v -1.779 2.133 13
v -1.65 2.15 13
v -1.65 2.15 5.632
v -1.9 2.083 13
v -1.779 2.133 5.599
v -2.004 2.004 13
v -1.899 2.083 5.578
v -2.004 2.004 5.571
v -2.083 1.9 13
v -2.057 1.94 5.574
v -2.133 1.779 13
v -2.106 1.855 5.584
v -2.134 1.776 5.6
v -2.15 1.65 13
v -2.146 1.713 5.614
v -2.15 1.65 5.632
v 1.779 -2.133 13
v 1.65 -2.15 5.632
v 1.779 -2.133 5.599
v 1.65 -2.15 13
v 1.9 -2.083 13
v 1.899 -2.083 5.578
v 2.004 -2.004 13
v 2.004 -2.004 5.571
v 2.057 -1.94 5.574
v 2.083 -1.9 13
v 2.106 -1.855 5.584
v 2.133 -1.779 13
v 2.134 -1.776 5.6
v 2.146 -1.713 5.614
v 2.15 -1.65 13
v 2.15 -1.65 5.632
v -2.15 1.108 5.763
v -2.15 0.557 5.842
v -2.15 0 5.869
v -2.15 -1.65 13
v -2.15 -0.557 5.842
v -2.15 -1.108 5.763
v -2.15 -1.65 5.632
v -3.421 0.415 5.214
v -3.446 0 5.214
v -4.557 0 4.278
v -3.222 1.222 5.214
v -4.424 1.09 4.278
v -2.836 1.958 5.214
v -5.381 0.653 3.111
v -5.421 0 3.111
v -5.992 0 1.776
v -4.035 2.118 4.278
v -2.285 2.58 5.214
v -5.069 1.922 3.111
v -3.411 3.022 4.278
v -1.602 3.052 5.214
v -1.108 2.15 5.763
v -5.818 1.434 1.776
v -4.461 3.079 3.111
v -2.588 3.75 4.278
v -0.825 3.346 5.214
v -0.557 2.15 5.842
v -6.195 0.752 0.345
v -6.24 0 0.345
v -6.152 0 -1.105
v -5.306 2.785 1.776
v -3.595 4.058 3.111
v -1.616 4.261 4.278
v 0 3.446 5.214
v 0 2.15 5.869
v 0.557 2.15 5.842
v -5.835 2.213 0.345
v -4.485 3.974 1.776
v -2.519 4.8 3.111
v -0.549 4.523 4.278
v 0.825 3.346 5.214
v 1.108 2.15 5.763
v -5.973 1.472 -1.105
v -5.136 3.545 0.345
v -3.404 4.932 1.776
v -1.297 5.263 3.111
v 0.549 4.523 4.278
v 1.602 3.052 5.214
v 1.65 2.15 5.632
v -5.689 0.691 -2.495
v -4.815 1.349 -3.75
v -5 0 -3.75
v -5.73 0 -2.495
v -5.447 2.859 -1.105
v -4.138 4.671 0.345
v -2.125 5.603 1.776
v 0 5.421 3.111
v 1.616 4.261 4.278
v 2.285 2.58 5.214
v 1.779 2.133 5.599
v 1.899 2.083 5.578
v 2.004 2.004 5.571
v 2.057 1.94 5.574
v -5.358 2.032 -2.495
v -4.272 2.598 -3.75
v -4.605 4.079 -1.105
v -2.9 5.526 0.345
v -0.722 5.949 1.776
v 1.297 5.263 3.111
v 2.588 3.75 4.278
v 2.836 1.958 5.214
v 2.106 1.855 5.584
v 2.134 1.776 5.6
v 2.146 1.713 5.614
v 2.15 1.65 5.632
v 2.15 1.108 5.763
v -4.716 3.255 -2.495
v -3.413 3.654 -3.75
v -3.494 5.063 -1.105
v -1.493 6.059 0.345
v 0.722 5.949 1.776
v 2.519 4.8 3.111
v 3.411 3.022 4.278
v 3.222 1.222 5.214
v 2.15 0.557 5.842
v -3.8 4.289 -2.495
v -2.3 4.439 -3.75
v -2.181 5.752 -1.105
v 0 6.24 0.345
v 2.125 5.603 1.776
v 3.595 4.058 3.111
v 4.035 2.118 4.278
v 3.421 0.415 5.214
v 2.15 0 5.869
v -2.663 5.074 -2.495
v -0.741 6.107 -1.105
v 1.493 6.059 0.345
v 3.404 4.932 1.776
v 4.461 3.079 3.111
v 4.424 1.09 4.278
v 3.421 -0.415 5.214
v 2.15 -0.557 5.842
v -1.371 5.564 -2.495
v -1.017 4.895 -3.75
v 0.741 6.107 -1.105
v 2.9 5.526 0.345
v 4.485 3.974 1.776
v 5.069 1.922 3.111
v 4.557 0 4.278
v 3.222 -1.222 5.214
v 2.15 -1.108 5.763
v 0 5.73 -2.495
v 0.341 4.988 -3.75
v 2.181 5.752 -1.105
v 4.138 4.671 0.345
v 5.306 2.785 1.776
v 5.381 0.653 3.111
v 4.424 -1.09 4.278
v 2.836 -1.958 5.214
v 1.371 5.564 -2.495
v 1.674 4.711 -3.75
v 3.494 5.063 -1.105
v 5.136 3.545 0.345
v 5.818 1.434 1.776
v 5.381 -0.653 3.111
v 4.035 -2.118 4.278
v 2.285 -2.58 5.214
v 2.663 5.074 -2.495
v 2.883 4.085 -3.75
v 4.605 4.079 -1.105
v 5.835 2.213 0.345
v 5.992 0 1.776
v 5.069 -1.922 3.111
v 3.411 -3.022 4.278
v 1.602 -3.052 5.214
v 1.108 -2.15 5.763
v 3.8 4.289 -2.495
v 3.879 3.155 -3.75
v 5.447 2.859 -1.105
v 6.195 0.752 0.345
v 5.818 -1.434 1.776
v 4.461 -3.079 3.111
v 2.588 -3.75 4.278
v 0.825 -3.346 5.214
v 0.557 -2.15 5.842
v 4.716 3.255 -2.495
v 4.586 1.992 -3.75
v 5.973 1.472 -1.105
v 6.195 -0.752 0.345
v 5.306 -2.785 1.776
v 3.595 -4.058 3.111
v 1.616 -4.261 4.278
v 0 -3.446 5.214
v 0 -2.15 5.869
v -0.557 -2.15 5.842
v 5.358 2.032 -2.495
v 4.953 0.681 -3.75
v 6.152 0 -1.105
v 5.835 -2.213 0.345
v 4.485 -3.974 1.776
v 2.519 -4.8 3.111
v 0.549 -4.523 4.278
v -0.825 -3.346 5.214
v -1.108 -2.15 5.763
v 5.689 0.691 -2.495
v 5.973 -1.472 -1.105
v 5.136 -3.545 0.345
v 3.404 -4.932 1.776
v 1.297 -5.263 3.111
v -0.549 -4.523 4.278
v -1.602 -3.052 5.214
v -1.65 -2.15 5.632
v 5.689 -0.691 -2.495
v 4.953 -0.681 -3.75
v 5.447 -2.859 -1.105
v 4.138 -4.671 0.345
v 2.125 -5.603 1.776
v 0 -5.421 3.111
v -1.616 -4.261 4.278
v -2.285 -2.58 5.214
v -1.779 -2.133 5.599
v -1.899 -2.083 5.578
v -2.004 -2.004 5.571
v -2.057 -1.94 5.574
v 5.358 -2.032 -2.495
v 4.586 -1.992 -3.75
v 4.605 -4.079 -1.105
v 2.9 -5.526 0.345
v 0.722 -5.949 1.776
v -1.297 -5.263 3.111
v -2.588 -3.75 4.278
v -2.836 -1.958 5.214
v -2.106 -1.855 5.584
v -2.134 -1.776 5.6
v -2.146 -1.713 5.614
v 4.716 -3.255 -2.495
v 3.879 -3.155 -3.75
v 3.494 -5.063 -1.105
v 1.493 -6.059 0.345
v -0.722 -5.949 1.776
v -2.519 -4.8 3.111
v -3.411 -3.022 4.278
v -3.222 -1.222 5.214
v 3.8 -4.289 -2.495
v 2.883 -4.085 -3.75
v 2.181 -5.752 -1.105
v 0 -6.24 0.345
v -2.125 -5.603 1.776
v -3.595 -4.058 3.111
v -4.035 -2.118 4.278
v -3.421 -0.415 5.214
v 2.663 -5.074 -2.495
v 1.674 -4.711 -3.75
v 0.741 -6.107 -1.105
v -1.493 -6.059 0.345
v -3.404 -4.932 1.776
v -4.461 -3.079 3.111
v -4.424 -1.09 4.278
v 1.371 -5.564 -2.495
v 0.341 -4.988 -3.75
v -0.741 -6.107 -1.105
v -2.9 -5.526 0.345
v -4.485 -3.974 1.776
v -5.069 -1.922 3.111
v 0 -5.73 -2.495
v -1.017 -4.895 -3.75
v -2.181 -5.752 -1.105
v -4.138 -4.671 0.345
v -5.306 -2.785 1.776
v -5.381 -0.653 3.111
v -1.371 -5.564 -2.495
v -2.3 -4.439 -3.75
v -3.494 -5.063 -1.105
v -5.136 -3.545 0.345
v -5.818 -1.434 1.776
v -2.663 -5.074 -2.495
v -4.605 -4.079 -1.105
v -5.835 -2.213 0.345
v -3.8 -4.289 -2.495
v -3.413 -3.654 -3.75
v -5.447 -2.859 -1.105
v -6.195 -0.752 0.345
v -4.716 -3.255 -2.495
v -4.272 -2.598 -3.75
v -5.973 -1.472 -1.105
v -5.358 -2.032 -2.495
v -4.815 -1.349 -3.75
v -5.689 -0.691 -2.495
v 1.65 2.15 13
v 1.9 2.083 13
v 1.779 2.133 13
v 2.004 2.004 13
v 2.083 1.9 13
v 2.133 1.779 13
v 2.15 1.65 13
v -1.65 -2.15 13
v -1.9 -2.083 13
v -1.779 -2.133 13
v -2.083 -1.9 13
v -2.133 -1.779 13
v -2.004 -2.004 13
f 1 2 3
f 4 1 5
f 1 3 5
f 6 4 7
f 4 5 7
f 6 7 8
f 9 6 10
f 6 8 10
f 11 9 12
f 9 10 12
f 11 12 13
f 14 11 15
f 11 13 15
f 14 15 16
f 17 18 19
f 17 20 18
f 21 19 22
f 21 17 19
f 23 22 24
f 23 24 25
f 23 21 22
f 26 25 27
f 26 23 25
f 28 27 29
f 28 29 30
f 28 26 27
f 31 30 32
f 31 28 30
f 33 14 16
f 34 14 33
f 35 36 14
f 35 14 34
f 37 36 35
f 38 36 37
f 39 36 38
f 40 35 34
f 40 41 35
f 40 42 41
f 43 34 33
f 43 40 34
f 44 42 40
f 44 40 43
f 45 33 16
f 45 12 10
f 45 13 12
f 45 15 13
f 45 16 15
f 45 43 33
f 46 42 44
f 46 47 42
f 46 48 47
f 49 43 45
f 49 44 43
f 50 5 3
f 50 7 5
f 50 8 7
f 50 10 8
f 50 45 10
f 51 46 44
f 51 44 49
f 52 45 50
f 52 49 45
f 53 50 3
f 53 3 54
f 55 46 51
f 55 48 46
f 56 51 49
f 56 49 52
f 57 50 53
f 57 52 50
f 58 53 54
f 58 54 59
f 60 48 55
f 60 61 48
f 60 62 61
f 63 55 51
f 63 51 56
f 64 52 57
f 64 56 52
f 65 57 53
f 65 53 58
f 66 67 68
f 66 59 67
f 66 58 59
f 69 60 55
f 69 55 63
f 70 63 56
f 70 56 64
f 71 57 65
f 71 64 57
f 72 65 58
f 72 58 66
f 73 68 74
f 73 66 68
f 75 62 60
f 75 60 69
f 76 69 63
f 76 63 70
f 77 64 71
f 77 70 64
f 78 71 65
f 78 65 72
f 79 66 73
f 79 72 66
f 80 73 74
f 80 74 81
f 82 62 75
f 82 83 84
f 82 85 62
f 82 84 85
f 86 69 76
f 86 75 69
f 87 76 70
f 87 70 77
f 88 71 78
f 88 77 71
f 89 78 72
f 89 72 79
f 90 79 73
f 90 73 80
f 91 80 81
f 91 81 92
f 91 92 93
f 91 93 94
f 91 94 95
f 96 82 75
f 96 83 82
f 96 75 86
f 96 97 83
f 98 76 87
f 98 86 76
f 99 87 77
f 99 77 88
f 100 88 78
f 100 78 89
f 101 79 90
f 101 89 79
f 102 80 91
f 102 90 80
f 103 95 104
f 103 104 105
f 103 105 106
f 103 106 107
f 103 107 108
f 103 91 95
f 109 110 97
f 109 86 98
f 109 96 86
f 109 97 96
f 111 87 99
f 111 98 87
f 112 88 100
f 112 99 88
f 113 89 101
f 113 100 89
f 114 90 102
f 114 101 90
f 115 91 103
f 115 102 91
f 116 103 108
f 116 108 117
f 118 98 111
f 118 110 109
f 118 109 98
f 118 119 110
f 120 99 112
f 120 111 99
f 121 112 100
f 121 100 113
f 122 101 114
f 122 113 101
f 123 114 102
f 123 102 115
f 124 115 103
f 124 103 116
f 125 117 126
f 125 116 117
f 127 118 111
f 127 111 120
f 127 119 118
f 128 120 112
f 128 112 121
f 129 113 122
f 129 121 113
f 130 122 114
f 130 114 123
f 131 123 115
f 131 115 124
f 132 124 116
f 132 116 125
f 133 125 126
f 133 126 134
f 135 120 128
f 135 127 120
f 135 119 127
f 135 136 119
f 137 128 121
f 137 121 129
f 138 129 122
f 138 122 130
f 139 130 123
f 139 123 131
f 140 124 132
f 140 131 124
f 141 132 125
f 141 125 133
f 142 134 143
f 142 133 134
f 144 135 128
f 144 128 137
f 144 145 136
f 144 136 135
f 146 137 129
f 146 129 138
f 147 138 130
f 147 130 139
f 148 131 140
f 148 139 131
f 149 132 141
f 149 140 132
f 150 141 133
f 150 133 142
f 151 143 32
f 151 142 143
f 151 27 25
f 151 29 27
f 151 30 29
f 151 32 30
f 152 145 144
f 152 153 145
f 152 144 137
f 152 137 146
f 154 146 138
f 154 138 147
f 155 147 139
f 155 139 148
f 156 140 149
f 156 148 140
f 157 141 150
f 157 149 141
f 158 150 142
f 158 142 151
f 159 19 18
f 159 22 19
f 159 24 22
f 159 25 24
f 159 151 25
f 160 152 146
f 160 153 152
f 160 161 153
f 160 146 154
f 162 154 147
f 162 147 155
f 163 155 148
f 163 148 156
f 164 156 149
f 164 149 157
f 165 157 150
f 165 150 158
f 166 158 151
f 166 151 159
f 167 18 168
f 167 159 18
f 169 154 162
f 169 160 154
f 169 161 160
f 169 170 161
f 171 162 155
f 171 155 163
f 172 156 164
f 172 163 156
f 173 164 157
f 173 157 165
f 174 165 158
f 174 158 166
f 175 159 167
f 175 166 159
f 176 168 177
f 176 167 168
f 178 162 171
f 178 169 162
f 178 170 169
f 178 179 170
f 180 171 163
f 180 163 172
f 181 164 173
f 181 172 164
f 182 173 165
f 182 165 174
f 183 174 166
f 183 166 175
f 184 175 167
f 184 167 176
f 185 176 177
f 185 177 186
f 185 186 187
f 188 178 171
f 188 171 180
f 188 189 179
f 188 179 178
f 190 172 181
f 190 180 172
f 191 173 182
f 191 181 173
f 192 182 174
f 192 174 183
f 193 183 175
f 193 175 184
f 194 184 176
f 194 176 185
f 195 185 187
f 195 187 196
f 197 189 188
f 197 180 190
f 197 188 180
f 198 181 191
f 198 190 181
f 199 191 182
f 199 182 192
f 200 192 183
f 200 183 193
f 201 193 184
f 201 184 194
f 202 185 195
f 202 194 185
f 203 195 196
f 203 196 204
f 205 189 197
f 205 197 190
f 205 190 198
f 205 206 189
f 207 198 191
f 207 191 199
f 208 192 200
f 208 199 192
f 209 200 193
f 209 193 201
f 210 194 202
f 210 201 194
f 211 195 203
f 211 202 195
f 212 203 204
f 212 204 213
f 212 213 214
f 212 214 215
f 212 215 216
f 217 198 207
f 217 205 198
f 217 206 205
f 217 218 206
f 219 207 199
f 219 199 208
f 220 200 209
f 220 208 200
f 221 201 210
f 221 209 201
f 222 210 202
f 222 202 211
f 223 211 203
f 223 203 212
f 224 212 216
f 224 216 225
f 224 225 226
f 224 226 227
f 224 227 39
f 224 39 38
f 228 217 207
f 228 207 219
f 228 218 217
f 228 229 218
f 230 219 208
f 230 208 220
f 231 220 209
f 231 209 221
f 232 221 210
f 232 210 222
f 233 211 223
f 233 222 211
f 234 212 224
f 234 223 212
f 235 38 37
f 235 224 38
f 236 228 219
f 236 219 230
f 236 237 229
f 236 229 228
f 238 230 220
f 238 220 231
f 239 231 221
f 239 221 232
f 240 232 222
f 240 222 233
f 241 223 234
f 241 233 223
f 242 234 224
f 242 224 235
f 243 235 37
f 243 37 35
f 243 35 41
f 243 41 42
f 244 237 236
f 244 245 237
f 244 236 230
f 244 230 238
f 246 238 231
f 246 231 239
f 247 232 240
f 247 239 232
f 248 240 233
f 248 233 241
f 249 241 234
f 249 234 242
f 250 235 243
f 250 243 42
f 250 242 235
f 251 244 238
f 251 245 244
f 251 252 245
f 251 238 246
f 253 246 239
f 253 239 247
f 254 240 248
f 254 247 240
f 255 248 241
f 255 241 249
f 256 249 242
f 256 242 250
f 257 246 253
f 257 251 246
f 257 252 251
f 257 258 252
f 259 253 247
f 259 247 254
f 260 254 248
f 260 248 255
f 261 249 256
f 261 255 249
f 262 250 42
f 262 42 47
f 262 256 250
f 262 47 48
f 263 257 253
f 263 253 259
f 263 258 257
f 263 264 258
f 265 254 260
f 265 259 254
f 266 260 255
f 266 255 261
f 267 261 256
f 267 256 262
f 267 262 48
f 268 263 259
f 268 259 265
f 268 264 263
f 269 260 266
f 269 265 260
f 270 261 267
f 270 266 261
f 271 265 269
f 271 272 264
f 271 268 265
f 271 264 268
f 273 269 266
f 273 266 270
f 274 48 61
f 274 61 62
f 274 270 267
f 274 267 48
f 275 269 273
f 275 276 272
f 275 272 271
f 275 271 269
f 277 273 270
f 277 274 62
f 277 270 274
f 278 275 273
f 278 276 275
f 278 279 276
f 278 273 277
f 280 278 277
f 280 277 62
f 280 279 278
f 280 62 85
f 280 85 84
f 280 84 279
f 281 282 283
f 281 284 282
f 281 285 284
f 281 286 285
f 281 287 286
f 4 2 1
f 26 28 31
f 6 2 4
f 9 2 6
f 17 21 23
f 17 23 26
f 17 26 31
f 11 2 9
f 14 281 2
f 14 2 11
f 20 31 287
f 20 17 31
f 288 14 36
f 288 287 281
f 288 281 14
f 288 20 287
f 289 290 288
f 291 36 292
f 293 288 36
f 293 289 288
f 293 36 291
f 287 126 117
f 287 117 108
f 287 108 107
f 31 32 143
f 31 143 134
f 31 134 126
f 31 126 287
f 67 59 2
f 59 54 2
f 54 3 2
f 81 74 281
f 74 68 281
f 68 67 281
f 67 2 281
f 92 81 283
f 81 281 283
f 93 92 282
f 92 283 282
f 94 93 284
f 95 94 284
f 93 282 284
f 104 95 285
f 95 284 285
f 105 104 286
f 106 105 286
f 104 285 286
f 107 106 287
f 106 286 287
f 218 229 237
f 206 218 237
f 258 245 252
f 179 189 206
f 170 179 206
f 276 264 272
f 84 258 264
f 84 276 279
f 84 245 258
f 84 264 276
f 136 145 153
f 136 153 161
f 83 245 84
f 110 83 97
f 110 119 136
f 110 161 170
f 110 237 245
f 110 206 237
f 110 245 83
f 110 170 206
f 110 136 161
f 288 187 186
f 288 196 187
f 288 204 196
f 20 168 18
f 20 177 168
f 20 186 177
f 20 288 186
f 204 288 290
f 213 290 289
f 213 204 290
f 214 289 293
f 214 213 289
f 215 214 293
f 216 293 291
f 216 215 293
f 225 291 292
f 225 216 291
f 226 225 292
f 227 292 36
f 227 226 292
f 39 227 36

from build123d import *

# Parameters (mm, degrees)
F2_DEPTH = 2.15
F3_R     = 0.5


with BuildPart() as f1:
    # F0 (on Front) → F1 (revolve)
    with BuildSketch(Plane.XZ):
        with BuildLine():
            Line((-2.15, 0), (-2.15, 5.8685603004))
            ThreePointArc((-2.15, 5.8685603004), (-5.9924786661, 1.7755842522), (-5, -3.75))
            Line((-5, -3.75), (0, -3.75))
            Line((0, -3.75), (0, 0))
            Line((0, 0), (-2.15, 0))
        make_face()
        with BuildLine():
            Line((0, 0), (0, 6.25))
            ThreePointArc((0, 6.25), (-1.0917870951, 6.153901278), (-2.15, 5.8685603004))
            Line((-2.15, 5.8685603004), (-2.15, 0))
            Line((-2.15, 0), (0, 0))
        make_face()
    revolve(axis=Axis((0, 0, 1.25), (0, 0, -1)))

    # F0 (on Front) → F2 (join, symmetric)
    with BuildSketch(Plane.XZ):
        with BuildLine():
            Line((0, 0), (0, 6.25))
            ThreePointArc((0, 6.25), (-1.0917870951, 6.153901278), (-2.15, 5.8685603004))
            Line((-2.15, 5.8685603004), (-2.15, 0))
            Line((-2.15, 0), (0, 0))
        make_face()
        with BuildLine():
            ThreePointArc((-2.15, 5.8685603004), (-1.0917870951, 6.153901278), (0, 6.25))
            Line((0, 6.25), (0, 0))
            Line((0, 0), (2.15, 0))
            Line((2.15, 0), (2.15, 13))
            Line((2.15, 13), (-2.15, 13))
            Line((-2.15, 13), (-2.15, 5.8685603004))
        make_face()
    extrude(amount=F2_DEPTH, both=True)

    # F3
    f3_edges = [f1.edges().sort_by_distance(p)[0] for p in [
        (-2.15, -2.15, 9.23027),
        (-2.15, 2.15, 9.23027),
        (2.15, -2.15, 9.23027),
        (2.15, 2.15, 9.23027),
    ]]
    fillet(f3_edges, radius=F3_R)


solid = f1.part
